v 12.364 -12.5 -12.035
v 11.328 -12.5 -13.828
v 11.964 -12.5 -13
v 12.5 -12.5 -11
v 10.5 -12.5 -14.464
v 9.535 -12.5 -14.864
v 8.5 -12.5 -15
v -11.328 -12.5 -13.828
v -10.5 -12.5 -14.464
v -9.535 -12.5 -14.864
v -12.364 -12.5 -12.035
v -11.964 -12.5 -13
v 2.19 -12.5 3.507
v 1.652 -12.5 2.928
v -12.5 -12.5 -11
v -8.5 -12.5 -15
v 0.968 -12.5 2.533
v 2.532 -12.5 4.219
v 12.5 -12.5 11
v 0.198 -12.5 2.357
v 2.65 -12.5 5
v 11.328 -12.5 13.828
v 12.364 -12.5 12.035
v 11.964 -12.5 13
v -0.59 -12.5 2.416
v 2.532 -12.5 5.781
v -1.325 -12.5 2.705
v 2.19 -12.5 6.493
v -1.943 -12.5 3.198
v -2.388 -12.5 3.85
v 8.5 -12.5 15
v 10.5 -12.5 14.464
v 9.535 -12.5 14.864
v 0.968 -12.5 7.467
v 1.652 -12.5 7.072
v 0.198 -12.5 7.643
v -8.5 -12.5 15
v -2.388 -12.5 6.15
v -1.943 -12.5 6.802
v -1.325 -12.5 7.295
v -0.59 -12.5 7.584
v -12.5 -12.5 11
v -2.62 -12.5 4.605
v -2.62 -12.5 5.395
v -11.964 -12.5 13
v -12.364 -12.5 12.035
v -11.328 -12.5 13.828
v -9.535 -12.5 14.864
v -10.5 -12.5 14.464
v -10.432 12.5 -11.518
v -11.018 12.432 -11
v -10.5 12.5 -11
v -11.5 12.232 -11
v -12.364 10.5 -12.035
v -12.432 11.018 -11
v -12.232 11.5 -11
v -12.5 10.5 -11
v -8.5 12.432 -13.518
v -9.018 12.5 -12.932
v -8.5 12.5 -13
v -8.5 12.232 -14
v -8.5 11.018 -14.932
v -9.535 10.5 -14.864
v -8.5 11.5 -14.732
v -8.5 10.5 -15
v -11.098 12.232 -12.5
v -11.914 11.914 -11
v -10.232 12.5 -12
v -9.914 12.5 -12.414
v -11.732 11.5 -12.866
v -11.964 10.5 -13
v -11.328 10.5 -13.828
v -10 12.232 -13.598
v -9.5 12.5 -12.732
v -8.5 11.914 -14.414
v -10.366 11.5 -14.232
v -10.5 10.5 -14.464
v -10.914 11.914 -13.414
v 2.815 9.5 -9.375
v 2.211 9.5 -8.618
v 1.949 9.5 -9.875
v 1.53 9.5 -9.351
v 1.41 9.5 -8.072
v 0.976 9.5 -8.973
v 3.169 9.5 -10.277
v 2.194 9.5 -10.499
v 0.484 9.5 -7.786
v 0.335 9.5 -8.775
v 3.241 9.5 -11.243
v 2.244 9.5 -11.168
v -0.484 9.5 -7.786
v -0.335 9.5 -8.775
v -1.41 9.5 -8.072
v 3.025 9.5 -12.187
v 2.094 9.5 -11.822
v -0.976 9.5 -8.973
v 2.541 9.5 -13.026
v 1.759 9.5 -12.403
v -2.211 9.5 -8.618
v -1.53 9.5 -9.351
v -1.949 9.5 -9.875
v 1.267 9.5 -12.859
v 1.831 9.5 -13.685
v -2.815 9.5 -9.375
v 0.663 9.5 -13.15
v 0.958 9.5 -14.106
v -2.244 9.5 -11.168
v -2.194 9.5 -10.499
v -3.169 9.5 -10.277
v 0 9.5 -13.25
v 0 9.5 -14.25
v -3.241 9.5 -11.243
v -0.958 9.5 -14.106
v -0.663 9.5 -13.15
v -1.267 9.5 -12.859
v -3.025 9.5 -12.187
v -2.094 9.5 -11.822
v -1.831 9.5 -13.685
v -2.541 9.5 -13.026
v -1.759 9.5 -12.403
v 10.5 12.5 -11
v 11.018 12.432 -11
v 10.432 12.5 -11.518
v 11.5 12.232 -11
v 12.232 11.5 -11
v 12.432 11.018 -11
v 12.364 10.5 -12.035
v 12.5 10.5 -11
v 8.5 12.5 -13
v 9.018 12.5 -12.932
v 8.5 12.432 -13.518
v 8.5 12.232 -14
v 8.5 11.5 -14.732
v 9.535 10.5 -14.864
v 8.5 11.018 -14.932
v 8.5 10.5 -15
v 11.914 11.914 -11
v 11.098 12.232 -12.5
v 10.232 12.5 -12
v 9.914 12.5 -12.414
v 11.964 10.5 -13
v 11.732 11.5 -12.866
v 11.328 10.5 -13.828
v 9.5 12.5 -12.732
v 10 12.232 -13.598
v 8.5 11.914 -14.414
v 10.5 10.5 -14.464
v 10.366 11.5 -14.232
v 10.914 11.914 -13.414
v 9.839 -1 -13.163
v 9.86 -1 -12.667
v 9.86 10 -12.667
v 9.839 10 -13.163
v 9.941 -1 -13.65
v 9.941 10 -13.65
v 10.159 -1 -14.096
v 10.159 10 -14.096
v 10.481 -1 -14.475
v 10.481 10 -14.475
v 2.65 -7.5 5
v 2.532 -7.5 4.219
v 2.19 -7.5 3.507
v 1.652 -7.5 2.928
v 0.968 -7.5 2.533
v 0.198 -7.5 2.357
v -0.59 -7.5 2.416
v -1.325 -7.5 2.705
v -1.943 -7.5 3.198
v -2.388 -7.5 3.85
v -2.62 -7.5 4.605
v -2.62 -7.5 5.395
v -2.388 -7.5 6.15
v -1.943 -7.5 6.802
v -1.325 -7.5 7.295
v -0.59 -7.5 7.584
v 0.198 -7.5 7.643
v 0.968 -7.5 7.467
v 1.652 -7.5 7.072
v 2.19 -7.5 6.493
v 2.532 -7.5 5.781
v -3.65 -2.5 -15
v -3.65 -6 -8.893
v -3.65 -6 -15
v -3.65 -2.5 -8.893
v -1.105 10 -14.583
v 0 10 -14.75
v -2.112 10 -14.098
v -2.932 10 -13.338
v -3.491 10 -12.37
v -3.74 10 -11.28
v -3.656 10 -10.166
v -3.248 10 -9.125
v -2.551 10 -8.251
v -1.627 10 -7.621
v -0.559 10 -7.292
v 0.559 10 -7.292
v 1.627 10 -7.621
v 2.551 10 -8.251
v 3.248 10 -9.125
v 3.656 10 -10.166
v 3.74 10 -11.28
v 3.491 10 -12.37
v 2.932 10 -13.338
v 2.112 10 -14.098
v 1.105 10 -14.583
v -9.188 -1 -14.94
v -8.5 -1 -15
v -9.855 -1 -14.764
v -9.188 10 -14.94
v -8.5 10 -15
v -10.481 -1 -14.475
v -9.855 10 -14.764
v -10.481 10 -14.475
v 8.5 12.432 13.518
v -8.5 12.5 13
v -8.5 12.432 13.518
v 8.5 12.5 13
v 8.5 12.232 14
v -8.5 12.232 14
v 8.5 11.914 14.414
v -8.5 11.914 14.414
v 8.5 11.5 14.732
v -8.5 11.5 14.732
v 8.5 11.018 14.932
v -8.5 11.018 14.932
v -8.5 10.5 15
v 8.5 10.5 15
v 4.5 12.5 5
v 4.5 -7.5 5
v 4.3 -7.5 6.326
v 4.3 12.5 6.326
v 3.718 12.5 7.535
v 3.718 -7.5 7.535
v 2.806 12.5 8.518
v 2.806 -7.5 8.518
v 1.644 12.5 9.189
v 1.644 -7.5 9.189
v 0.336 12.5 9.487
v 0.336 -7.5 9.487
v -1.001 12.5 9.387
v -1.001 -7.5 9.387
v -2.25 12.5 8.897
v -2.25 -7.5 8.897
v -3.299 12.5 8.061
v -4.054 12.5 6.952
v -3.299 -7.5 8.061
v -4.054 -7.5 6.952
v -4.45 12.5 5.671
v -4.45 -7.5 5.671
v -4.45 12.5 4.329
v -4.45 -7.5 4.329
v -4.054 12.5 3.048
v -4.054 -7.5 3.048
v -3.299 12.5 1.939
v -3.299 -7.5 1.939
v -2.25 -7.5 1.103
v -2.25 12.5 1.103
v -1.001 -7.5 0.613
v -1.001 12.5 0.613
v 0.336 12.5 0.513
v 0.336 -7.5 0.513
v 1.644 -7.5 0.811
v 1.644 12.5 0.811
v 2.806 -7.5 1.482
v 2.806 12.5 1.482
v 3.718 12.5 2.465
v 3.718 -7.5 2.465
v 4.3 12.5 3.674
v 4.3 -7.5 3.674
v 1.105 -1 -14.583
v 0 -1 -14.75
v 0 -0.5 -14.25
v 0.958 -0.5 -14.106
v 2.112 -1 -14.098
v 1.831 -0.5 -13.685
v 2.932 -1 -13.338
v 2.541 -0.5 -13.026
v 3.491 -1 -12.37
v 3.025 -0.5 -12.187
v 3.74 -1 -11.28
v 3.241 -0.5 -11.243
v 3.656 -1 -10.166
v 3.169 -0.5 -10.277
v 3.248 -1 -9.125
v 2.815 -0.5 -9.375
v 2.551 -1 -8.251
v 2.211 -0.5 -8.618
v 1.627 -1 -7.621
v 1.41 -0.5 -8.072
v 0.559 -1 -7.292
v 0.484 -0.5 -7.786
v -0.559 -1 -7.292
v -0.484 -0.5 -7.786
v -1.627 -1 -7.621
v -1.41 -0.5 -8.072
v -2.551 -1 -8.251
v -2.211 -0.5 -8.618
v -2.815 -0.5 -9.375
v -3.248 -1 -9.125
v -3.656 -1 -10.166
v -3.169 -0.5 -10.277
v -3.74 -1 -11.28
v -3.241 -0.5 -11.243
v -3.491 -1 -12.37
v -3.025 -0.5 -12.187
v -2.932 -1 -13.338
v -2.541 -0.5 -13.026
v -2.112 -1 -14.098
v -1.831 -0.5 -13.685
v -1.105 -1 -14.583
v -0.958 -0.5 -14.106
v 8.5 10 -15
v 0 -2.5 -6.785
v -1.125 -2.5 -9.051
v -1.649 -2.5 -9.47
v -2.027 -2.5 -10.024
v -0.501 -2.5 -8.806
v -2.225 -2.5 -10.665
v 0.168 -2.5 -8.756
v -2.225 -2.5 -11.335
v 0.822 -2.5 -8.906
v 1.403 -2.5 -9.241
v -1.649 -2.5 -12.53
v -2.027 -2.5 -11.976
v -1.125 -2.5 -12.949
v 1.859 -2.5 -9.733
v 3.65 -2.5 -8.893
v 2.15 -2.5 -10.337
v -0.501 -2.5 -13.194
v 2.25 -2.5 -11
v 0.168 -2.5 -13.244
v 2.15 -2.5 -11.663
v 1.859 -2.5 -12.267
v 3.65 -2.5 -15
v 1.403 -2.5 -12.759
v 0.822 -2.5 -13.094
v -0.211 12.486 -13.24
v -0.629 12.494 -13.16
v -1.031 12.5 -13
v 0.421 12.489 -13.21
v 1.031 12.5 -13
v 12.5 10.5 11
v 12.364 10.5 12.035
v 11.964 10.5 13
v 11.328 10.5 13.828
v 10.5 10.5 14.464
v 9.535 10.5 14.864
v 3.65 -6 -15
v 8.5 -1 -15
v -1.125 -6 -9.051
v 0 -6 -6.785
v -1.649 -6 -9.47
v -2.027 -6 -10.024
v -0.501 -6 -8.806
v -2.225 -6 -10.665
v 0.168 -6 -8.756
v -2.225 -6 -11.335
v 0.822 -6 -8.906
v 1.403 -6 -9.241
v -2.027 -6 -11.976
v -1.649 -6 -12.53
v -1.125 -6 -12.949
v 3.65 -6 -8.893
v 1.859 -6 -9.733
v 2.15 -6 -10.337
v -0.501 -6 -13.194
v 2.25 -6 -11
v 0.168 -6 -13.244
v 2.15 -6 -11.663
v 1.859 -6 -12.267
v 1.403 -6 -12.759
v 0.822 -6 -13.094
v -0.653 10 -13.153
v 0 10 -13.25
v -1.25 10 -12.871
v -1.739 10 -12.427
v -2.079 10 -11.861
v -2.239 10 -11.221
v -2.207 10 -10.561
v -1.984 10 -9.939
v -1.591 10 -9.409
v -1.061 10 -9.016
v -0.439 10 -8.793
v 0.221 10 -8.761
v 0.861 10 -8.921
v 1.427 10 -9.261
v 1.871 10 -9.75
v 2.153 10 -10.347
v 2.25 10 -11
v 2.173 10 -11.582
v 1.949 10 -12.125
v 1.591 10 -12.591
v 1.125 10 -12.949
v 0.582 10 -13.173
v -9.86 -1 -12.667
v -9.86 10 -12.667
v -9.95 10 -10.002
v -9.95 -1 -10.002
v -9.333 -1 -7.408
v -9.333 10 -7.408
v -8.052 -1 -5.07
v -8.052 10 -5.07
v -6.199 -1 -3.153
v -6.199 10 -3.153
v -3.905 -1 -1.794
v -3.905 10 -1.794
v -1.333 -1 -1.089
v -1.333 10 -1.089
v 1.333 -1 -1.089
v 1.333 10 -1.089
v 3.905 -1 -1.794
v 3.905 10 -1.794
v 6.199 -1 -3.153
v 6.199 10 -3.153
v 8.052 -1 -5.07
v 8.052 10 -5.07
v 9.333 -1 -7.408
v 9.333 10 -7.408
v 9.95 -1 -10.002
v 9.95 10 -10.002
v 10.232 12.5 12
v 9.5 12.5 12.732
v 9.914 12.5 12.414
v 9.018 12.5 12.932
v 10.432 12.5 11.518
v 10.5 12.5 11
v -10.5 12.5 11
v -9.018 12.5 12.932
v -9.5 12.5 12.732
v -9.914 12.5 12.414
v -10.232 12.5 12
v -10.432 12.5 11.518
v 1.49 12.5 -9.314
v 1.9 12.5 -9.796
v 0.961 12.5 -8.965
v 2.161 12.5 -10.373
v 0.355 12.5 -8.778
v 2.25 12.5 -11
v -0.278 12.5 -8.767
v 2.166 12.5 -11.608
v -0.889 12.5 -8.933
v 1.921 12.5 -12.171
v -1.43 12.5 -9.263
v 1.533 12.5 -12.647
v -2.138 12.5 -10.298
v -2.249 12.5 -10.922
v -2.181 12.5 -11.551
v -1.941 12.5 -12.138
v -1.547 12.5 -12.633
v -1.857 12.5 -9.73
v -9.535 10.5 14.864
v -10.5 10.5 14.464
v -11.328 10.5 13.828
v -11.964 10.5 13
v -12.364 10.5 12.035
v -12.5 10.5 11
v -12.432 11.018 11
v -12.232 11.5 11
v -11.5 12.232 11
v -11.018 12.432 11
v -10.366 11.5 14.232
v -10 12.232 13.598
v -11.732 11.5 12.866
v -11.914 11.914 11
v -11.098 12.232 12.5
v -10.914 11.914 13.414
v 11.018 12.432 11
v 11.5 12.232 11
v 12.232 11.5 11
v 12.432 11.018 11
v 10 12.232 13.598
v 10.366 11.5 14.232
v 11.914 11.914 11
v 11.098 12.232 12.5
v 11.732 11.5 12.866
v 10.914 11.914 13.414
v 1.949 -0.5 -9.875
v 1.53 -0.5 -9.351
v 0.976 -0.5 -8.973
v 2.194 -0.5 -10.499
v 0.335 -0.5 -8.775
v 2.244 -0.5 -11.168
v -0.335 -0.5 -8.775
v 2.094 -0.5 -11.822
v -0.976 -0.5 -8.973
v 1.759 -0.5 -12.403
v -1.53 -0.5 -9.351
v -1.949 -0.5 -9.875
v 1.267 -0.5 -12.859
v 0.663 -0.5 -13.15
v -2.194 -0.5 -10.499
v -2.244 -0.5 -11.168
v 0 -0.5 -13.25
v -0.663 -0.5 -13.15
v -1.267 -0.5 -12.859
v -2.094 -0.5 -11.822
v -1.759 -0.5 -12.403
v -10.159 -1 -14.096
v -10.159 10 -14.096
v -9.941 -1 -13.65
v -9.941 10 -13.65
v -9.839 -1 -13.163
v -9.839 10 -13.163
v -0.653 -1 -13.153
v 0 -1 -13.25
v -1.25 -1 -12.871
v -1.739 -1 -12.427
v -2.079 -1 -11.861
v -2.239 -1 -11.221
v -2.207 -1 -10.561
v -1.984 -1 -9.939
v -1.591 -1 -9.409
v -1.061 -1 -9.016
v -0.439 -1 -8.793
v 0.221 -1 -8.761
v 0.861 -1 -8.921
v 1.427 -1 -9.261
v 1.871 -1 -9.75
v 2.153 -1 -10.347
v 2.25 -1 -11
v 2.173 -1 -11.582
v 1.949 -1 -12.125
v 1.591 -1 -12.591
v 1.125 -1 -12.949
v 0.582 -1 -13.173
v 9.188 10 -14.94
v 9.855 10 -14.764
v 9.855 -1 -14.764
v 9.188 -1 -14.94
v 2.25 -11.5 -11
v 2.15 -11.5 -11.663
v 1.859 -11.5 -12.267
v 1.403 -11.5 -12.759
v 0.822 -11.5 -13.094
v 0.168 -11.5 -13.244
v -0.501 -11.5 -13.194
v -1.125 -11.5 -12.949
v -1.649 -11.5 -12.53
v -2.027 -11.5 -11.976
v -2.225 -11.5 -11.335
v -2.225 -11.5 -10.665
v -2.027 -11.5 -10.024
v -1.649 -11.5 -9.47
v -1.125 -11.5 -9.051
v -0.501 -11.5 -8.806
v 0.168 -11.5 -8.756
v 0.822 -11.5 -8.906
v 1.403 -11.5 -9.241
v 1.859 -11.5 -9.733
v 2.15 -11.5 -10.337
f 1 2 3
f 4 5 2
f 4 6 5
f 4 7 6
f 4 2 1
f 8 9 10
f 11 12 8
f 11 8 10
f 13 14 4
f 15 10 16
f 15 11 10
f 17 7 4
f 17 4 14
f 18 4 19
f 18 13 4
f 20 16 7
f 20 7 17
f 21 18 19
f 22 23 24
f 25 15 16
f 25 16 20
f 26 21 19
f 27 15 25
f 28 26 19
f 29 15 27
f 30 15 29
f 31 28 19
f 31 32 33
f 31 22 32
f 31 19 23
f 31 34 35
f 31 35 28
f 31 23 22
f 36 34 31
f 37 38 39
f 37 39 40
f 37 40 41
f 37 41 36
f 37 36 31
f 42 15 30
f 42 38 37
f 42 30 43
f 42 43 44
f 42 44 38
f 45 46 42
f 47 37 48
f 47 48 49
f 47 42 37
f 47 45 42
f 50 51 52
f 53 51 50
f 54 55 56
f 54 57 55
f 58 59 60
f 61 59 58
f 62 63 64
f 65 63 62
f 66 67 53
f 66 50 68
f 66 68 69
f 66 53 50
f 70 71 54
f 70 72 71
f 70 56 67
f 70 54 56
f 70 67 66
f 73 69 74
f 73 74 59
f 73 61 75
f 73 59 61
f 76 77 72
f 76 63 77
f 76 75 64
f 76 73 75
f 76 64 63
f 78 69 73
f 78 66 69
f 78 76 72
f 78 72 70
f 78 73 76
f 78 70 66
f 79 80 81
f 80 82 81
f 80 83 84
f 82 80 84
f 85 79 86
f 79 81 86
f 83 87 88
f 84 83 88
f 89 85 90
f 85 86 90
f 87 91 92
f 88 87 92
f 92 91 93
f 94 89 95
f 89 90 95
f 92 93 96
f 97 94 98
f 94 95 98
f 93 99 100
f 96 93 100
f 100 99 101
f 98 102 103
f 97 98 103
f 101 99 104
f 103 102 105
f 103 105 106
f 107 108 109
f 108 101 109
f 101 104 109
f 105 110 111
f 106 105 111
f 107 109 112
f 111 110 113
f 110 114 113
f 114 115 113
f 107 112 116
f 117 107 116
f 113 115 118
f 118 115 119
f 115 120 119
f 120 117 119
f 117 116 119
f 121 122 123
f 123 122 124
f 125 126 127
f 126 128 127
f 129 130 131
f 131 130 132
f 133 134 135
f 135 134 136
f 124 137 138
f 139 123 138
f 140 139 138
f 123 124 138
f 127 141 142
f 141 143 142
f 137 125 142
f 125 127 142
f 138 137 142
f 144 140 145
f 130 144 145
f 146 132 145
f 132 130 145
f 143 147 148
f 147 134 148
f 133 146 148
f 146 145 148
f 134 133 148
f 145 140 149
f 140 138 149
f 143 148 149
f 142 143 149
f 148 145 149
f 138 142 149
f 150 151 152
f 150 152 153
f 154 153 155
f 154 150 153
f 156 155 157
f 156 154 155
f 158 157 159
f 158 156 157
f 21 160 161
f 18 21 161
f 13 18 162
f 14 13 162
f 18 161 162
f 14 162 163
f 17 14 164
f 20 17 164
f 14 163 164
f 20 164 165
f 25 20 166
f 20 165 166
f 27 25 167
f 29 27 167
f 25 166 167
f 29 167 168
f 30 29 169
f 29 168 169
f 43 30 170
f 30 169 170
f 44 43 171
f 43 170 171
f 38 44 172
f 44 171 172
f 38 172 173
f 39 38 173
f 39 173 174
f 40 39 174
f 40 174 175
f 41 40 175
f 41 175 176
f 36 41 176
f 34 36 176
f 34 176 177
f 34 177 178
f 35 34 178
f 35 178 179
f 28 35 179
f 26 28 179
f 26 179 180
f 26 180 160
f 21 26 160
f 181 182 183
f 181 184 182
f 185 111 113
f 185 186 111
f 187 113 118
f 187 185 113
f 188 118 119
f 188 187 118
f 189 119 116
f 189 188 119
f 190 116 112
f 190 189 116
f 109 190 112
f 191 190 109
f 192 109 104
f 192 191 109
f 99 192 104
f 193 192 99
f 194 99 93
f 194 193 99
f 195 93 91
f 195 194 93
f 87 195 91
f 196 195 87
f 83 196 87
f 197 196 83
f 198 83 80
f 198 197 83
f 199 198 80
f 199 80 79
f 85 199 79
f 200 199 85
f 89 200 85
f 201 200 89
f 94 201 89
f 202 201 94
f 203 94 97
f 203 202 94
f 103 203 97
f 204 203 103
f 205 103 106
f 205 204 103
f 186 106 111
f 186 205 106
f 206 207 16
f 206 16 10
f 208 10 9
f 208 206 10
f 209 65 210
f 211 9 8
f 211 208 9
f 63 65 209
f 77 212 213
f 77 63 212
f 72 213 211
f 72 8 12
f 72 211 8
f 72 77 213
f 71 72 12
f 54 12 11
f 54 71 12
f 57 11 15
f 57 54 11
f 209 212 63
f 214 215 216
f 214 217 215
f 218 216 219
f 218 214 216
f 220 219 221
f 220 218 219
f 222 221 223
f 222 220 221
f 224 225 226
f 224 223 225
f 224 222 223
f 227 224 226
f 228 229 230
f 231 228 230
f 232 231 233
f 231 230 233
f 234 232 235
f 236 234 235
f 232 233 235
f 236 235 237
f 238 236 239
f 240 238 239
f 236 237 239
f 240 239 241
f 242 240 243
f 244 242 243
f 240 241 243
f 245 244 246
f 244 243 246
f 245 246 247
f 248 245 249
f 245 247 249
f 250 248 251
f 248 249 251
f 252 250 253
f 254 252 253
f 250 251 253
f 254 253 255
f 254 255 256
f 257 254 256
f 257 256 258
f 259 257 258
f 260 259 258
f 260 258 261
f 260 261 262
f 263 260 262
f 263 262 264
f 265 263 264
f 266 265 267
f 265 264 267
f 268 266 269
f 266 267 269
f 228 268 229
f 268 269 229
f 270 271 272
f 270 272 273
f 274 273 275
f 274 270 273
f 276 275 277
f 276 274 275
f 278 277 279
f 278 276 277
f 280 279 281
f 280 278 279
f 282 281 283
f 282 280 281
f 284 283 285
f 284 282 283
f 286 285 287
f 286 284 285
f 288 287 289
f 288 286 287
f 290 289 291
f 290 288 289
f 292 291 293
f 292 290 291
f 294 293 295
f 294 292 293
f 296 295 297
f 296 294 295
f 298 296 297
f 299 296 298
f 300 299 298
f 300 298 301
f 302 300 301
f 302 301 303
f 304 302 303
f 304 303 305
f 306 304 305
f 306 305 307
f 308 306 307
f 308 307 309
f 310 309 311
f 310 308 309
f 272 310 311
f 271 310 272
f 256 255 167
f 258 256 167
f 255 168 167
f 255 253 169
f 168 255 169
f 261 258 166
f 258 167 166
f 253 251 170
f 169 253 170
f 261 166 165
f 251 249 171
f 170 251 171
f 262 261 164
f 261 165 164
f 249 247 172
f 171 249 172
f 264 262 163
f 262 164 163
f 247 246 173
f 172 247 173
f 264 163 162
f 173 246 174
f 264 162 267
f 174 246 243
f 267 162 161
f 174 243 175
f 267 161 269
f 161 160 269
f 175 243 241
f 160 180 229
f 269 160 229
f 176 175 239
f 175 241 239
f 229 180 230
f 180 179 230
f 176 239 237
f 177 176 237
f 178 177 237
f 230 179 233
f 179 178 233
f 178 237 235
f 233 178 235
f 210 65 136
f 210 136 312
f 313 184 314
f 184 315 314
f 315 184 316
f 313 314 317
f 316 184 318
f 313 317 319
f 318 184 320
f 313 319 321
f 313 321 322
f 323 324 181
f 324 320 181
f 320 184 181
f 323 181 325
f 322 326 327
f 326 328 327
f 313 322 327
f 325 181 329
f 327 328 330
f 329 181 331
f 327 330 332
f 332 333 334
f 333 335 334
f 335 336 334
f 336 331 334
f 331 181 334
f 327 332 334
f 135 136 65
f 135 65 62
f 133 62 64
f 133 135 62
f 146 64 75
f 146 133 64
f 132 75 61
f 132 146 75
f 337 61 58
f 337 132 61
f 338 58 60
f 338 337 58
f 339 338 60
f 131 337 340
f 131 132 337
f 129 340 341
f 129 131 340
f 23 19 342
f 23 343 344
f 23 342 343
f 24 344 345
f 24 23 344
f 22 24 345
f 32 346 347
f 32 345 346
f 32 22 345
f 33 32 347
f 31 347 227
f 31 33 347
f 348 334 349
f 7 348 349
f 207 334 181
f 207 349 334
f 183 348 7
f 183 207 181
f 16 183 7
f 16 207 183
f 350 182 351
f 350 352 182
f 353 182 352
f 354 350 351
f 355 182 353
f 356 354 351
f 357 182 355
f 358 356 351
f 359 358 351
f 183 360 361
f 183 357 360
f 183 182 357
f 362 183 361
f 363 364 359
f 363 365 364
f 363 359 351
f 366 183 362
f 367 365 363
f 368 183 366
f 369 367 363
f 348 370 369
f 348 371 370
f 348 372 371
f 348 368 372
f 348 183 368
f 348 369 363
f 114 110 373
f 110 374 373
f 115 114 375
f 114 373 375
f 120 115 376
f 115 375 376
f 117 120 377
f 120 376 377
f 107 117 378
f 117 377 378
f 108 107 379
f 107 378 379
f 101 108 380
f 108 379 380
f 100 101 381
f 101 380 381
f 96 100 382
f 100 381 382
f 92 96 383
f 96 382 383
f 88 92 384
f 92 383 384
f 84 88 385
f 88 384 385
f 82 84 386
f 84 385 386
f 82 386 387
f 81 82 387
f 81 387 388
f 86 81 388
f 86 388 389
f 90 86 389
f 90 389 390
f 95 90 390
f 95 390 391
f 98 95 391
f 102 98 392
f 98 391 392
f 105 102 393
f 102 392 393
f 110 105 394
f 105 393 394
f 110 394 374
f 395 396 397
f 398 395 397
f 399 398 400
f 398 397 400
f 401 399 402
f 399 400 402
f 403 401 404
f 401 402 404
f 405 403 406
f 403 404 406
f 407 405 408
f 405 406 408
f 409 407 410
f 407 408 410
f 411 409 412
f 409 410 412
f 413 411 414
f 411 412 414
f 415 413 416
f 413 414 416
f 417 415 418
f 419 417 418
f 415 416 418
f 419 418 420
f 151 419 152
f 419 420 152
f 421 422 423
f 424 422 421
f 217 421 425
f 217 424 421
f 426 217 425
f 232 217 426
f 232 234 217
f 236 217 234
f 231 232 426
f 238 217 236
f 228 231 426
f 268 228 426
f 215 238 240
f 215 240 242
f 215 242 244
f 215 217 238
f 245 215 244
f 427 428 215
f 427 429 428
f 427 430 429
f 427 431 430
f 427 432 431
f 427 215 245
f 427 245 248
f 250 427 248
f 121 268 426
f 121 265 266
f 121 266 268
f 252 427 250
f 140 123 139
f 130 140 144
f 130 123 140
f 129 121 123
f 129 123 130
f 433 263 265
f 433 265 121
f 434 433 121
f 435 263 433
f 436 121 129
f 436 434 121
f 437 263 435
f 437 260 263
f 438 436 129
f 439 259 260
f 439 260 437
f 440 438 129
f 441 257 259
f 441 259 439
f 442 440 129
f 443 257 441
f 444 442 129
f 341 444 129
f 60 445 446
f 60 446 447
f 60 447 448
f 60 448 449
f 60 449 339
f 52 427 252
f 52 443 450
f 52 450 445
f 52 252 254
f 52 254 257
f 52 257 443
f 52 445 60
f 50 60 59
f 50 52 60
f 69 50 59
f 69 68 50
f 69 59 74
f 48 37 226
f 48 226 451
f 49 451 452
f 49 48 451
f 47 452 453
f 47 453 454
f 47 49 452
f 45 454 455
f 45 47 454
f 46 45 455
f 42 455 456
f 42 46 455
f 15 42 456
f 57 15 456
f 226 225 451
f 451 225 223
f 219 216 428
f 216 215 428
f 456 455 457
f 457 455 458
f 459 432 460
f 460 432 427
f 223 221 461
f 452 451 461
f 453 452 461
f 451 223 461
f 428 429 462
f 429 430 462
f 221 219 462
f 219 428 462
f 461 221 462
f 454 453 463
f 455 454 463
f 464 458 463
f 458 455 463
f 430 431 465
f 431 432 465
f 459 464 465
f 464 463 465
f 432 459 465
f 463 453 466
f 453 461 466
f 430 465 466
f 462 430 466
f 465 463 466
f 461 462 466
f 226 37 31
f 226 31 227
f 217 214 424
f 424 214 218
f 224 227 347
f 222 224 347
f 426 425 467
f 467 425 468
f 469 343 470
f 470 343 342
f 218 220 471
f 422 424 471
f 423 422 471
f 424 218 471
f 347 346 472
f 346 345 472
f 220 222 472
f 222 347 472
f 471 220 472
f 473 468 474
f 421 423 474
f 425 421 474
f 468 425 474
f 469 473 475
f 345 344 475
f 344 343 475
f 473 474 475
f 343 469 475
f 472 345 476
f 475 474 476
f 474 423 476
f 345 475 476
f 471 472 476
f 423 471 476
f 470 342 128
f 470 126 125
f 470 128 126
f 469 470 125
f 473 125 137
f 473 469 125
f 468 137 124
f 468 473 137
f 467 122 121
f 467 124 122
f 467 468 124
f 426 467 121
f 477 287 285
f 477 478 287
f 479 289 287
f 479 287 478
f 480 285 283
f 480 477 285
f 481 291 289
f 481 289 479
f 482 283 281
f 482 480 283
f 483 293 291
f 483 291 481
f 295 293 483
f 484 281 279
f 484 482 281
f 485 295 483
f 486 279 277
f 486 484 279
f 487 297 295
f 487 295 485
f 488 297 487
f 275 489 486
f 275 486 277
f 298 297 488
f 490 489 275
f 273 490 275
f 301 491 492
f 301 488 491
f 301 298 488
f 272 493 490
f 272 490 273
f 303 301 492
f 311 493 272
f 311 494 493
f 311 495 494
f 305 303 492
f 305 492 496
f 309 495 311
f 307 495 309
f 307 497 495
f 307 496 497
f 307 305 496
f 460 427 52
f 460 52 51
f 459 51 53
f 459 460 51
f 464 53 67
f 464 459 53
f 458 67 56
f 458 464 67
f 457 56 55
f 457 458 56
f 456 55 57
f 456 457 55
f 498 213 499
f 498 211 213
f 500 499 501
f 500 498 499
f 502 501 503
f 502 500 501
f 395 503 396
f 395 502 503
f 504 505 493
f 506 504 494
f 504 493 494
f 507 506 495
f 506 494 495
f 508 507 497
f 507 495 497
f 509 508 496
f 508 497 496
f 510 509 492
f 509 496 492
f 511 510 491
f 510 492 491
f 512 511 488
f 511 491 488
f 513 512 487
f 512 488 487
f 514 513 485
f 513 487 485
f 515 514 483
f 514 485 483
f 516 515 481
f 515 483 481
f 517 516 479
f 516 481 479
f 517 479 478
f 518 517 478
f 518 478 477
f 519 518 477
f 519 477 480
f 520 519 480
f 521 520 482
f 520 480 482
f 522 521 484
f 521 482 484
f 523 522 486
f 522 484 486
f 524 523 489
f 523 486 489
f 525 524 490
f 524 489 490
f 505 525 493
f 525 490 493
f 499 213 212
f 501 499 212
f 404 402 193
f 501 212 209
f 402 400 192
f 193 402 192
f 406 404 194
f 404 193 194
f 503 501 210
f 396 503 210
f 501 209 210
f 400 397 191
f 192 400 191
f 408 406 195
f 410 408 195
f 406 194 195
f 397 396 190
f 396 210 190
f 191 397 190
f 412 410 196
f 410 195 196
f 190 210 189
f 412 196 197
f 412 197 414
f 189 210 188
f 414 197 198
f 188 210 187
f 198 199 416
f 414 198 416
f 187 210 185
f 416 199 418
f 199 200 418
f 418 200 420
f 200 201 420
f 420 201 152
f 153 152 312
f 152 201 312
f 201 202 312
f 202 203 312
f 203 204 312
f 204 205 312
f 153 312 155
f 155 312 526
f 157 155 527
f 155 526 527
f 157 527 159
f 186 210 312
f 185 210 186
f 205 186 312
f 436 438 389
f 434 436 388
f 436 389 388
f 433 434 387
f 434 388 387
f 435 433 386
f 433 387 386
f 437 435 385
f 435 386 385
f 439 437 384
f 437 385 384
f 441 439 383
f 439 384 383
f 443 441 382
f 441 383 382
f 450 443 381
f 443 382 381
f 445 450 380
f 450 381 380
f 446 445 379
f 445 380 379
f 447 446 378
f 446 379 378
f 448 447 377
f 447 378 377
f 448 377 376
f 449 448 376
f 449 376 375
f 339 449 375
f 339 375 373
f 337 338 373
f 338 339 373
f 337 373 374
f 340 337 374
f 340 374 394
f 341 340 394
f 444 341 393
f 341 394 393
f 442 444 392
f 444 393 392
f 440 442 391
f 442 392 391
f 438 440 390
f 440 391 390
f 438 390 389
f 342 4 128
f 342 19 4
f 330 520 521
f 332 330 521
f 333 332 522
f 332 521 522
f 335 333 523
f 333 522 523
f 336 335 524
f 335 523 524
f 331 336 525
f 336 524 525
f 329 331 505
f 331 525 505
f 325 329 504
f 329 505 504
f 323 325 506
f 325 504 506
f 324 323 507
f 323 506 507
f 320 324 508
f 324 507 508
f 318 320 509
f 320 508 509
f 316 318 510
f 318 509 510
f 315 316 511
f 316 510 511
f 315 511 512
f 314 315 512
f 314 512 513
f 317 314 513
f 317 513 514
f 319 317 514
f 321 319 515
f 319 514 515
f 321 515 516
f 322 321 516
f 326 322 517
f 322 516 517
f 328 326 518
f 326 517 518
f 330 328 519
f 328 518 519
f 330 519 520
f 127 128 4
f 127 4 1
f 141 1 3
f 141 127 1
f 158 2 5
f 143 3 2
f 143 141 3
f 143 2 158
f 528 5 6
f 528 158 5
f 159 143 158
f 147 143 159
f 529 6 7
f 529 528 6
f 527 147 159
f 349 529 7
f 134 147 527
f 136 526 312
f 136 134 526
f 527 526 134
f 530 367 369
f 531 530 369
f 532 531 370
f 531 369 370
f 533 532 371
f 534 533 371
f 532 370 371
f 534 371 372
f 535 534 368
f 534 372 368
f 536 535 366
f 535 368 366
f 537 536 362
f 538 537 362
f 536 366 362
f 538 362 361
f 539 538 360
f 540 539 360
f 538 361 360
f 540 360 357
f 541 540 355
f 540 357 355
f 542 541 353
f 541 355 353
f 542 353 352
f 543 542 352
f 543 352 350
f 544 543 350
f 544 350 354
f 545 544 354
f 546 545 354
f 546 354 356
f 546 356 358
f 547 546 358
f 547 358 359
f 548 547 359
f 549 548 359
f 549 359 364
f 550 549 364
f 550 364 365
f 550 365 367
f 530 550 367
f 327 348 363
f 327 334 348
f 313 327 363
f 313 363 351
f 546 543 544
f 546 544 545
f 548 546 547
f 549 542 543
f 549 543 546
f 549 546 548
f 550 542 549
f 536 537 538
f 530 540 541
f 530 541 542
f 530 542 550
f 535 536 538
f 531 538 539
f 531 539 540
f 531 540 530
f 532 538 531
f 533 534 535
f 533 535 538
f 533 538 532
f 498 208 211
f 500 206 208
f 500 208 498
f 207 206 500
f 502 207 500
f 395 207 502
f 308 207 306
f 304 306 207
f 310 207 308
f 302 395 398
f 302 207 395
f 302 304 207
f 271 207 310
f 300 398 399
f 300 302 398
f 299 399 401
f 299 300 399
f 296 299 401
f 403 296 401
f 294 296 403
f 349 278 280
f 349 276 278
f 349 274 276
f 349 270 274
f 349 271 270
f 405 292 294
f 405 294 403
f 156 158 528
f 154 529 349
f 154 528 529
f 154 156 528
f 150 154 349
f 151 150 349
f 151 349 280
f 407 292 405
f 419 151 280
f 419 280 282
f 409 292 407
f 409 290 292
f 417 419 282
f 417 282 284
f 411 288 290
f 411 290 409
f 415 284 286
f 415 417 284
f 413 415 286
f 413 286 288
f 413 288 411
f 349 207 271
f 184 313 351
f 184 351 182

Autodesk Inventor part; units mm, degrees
sketch "Sketch1" plane through (0, 0, 0) normal (1, 0, 0) x (0, 1, 0)
  line L0 (-12.5, 15) -> (12.5, 15)
  line L1 (12.5, 15) -> (12.5, -15)
  line L2 (12.5, -15) -> (-12.5, -15)
  line L3 (-12.5, -15) -> (-12.5, 15)
  line L4 (-12.5, 15) -> (12.5, -15) construction
  line L5 (12.5, 15) -> (-12.5, -15) construction
  point P0 (0, 0)
  dimension "d0" = 30
  dimension "d1" = 25
extrude "Extrusion1" add sketch "Sketch1" along normal mid plane 25
sketch "Sketch5" plane through (-12.5, 12.5, 15) normal (0, 1, 0) x (1, 0, 0)
  line L0 (0, 30) -> (0, 0) projected
  line L1 (25, 0) -> (25, 30) projected
  circle A0 centre (12.5, 10) radius 2.65
  line L2 (12.5, 10) -> (12.5, 0) construction
  line L3 (0, 0) -> (25, 0) projected
  point P0 (12.5, 15)
  dimension "d22" = 5.3
  dimension "d25" = 10
extrude "Extrusion5" cut sketch "Sketch5" against normal through all
ref_plane "Work Plane1" through (-12.5, 4.5, 15) normal (0, 1, 0) x (1, 0, 0)
sketch "Sketch2" plane through (-12.5, 4.5, 15) normal (0, 1, 0) x (1, 0, 0)
  circle A0 centre (12.5, 26) radius 9 construction
  circle A1 centre (12.5, 26) radius 1.75 construction
  line L0 (0, 30) -> (25, 30) construction
  line L1 (12.5, 30) -> (12.5, 26)
  circle A2 centre (12.5, 26) radius 10
  point P0 (12.5, 15)
  dimension "d5" = 4
  dimension "d6" = 3.5
  dimension "d7" = 18
  dimension "d8" = 1
extrude "Extrusion2" cut sketch "Sketch2" against normal mid plane 11
sketch "Sketch3" plane through (-12.5, 4.5, 15) normal (0, 1, 0) x (1, 0, 0)
  arc A0 (3.3348, 30) -> (21.6652, 30) centre (12.5, 26) ccw projected
  circle A1 centre (12.5, 26) radius 2.25
  point P0 (12.5, 15)
  point P1 (20, 16)
  point P2 (0, 16)
  dimension "d11" = 4.5
extrude "Extrusion3" cut sketch "Sketch3" along normal blind 10 and the other way blind 16
ref_plane "Work Plane2" through (-12.5, -2.5, 15) normal (0, 1, 0) x (1, 0, 0)
sketch "Sketch4" plane through (-12.5, -2.5, 15) normal (0, 1, 0) x (1, 0, 0)
  circle A0 centre (12.5, 26) radius 2.25 projected
  line L0 (12.5, 30.2147) -> (16.15, 28.1073) construction
  line L1 (16.15, 28.1073) -> (16.15, 23.8927)
  line L2 (16.15, 23.8927) -> (12.5, 21.7853)
  line L3 (12.5, 21.7853) -> (8.85, 23.8927)
  line L4 (8.85, 23.8927) -> (8.85, 28.1073)
  line L5 (8.85, 28.1073) -> (12.5, 30.2147) construction
  line L6 (8.85, 28.1073) -> (8.85, 36.3706)
  line L7 (8.85, 36.3706) -> (16.15, 36.3706)
  line L8 (16.15, 36.3706) -> (16.15, 28.1073)
  point P0 (12.5, 15)
  dimension "d46" = 7.3
extrude "Extrusion4" cut sketch "Sketch4" against normal blind 3.5
fillet "Fillet1" radius 2 2 edges at (9.1652, 4.5, -15) (-9.1652, 4.5, -15)
fillet "Fillet1" radius 4 4 edges at (12.5, 0, -15) (-12.5, 0, -15) (-12.5, 0, 15) (12.5, 0, 15)
fillet "Fillet1" radius 2 4 edges at (12.5, 12.5, 0) (0, 12.5, 15) (-12.5, 12.5, 0) (0, 12.5, -15)
ref_plane "Work Plane3" through (-12.5, -7.5, -11) normal (0, -1, 0) x (1, 0, 0)
sketch "Sketch6" plane through (-12.5, -7.5, -11) normal (0, -1, 0) x (1, 0, 0)
  circle A0 centre (12.5, 16) radius 2.65 projected
  circle A1 centre (12.5, 16) radius 4.5
  point P0 (12.5, 11)
  dimension "d27" = 9
extrude "Extrusion6" cut sketch "Sketch6" against normal through all contours A0 | A1
sketch "Sketch9" plane through (0, 0, 0) normal (1, 0, 0) x (0, 1, 0)
  line L0 (-17.5, -11) -> (17.5, -11) projected
  line L1 (-1, -8.75) -> (-1, -13.25) projected
  line L2 (10, -13.25) -> (10, -8.75) projected
  line L3 (10, -13.25) -> (10, -14.75)
  line L4 (10, -14.75) -> (9.5, -14.25)
  line L5 (9.5, -14.25) -> (9.5, -13.25)
  line L6 (9.5, -13.25) -> (10, -13.25)
  line L7 (-1, -13.25) -> (-0.5, -13.25)
  line L8 (-0.5, -13.25) -> (-0.5, -14.25)
  line L9 (-0.5, -14.25) -> (-1, -14.75)
  line L10 (-1, -14.75) -> (-1, -13.25)
  point P0 (0, 0)
  dimension "d38" = 0.5
  dimension "d39" = 1
  dimension "d40" = 45
  dimension "d41" = 0.5
  dimension "d42" = 1
  dimension "d43" = 45
revolve "Revolution1" add sketch "Sketch9" angle 360 about axis through (0, 4.5, -11) along (0, 1, 0)
properties part number "YIdler"
